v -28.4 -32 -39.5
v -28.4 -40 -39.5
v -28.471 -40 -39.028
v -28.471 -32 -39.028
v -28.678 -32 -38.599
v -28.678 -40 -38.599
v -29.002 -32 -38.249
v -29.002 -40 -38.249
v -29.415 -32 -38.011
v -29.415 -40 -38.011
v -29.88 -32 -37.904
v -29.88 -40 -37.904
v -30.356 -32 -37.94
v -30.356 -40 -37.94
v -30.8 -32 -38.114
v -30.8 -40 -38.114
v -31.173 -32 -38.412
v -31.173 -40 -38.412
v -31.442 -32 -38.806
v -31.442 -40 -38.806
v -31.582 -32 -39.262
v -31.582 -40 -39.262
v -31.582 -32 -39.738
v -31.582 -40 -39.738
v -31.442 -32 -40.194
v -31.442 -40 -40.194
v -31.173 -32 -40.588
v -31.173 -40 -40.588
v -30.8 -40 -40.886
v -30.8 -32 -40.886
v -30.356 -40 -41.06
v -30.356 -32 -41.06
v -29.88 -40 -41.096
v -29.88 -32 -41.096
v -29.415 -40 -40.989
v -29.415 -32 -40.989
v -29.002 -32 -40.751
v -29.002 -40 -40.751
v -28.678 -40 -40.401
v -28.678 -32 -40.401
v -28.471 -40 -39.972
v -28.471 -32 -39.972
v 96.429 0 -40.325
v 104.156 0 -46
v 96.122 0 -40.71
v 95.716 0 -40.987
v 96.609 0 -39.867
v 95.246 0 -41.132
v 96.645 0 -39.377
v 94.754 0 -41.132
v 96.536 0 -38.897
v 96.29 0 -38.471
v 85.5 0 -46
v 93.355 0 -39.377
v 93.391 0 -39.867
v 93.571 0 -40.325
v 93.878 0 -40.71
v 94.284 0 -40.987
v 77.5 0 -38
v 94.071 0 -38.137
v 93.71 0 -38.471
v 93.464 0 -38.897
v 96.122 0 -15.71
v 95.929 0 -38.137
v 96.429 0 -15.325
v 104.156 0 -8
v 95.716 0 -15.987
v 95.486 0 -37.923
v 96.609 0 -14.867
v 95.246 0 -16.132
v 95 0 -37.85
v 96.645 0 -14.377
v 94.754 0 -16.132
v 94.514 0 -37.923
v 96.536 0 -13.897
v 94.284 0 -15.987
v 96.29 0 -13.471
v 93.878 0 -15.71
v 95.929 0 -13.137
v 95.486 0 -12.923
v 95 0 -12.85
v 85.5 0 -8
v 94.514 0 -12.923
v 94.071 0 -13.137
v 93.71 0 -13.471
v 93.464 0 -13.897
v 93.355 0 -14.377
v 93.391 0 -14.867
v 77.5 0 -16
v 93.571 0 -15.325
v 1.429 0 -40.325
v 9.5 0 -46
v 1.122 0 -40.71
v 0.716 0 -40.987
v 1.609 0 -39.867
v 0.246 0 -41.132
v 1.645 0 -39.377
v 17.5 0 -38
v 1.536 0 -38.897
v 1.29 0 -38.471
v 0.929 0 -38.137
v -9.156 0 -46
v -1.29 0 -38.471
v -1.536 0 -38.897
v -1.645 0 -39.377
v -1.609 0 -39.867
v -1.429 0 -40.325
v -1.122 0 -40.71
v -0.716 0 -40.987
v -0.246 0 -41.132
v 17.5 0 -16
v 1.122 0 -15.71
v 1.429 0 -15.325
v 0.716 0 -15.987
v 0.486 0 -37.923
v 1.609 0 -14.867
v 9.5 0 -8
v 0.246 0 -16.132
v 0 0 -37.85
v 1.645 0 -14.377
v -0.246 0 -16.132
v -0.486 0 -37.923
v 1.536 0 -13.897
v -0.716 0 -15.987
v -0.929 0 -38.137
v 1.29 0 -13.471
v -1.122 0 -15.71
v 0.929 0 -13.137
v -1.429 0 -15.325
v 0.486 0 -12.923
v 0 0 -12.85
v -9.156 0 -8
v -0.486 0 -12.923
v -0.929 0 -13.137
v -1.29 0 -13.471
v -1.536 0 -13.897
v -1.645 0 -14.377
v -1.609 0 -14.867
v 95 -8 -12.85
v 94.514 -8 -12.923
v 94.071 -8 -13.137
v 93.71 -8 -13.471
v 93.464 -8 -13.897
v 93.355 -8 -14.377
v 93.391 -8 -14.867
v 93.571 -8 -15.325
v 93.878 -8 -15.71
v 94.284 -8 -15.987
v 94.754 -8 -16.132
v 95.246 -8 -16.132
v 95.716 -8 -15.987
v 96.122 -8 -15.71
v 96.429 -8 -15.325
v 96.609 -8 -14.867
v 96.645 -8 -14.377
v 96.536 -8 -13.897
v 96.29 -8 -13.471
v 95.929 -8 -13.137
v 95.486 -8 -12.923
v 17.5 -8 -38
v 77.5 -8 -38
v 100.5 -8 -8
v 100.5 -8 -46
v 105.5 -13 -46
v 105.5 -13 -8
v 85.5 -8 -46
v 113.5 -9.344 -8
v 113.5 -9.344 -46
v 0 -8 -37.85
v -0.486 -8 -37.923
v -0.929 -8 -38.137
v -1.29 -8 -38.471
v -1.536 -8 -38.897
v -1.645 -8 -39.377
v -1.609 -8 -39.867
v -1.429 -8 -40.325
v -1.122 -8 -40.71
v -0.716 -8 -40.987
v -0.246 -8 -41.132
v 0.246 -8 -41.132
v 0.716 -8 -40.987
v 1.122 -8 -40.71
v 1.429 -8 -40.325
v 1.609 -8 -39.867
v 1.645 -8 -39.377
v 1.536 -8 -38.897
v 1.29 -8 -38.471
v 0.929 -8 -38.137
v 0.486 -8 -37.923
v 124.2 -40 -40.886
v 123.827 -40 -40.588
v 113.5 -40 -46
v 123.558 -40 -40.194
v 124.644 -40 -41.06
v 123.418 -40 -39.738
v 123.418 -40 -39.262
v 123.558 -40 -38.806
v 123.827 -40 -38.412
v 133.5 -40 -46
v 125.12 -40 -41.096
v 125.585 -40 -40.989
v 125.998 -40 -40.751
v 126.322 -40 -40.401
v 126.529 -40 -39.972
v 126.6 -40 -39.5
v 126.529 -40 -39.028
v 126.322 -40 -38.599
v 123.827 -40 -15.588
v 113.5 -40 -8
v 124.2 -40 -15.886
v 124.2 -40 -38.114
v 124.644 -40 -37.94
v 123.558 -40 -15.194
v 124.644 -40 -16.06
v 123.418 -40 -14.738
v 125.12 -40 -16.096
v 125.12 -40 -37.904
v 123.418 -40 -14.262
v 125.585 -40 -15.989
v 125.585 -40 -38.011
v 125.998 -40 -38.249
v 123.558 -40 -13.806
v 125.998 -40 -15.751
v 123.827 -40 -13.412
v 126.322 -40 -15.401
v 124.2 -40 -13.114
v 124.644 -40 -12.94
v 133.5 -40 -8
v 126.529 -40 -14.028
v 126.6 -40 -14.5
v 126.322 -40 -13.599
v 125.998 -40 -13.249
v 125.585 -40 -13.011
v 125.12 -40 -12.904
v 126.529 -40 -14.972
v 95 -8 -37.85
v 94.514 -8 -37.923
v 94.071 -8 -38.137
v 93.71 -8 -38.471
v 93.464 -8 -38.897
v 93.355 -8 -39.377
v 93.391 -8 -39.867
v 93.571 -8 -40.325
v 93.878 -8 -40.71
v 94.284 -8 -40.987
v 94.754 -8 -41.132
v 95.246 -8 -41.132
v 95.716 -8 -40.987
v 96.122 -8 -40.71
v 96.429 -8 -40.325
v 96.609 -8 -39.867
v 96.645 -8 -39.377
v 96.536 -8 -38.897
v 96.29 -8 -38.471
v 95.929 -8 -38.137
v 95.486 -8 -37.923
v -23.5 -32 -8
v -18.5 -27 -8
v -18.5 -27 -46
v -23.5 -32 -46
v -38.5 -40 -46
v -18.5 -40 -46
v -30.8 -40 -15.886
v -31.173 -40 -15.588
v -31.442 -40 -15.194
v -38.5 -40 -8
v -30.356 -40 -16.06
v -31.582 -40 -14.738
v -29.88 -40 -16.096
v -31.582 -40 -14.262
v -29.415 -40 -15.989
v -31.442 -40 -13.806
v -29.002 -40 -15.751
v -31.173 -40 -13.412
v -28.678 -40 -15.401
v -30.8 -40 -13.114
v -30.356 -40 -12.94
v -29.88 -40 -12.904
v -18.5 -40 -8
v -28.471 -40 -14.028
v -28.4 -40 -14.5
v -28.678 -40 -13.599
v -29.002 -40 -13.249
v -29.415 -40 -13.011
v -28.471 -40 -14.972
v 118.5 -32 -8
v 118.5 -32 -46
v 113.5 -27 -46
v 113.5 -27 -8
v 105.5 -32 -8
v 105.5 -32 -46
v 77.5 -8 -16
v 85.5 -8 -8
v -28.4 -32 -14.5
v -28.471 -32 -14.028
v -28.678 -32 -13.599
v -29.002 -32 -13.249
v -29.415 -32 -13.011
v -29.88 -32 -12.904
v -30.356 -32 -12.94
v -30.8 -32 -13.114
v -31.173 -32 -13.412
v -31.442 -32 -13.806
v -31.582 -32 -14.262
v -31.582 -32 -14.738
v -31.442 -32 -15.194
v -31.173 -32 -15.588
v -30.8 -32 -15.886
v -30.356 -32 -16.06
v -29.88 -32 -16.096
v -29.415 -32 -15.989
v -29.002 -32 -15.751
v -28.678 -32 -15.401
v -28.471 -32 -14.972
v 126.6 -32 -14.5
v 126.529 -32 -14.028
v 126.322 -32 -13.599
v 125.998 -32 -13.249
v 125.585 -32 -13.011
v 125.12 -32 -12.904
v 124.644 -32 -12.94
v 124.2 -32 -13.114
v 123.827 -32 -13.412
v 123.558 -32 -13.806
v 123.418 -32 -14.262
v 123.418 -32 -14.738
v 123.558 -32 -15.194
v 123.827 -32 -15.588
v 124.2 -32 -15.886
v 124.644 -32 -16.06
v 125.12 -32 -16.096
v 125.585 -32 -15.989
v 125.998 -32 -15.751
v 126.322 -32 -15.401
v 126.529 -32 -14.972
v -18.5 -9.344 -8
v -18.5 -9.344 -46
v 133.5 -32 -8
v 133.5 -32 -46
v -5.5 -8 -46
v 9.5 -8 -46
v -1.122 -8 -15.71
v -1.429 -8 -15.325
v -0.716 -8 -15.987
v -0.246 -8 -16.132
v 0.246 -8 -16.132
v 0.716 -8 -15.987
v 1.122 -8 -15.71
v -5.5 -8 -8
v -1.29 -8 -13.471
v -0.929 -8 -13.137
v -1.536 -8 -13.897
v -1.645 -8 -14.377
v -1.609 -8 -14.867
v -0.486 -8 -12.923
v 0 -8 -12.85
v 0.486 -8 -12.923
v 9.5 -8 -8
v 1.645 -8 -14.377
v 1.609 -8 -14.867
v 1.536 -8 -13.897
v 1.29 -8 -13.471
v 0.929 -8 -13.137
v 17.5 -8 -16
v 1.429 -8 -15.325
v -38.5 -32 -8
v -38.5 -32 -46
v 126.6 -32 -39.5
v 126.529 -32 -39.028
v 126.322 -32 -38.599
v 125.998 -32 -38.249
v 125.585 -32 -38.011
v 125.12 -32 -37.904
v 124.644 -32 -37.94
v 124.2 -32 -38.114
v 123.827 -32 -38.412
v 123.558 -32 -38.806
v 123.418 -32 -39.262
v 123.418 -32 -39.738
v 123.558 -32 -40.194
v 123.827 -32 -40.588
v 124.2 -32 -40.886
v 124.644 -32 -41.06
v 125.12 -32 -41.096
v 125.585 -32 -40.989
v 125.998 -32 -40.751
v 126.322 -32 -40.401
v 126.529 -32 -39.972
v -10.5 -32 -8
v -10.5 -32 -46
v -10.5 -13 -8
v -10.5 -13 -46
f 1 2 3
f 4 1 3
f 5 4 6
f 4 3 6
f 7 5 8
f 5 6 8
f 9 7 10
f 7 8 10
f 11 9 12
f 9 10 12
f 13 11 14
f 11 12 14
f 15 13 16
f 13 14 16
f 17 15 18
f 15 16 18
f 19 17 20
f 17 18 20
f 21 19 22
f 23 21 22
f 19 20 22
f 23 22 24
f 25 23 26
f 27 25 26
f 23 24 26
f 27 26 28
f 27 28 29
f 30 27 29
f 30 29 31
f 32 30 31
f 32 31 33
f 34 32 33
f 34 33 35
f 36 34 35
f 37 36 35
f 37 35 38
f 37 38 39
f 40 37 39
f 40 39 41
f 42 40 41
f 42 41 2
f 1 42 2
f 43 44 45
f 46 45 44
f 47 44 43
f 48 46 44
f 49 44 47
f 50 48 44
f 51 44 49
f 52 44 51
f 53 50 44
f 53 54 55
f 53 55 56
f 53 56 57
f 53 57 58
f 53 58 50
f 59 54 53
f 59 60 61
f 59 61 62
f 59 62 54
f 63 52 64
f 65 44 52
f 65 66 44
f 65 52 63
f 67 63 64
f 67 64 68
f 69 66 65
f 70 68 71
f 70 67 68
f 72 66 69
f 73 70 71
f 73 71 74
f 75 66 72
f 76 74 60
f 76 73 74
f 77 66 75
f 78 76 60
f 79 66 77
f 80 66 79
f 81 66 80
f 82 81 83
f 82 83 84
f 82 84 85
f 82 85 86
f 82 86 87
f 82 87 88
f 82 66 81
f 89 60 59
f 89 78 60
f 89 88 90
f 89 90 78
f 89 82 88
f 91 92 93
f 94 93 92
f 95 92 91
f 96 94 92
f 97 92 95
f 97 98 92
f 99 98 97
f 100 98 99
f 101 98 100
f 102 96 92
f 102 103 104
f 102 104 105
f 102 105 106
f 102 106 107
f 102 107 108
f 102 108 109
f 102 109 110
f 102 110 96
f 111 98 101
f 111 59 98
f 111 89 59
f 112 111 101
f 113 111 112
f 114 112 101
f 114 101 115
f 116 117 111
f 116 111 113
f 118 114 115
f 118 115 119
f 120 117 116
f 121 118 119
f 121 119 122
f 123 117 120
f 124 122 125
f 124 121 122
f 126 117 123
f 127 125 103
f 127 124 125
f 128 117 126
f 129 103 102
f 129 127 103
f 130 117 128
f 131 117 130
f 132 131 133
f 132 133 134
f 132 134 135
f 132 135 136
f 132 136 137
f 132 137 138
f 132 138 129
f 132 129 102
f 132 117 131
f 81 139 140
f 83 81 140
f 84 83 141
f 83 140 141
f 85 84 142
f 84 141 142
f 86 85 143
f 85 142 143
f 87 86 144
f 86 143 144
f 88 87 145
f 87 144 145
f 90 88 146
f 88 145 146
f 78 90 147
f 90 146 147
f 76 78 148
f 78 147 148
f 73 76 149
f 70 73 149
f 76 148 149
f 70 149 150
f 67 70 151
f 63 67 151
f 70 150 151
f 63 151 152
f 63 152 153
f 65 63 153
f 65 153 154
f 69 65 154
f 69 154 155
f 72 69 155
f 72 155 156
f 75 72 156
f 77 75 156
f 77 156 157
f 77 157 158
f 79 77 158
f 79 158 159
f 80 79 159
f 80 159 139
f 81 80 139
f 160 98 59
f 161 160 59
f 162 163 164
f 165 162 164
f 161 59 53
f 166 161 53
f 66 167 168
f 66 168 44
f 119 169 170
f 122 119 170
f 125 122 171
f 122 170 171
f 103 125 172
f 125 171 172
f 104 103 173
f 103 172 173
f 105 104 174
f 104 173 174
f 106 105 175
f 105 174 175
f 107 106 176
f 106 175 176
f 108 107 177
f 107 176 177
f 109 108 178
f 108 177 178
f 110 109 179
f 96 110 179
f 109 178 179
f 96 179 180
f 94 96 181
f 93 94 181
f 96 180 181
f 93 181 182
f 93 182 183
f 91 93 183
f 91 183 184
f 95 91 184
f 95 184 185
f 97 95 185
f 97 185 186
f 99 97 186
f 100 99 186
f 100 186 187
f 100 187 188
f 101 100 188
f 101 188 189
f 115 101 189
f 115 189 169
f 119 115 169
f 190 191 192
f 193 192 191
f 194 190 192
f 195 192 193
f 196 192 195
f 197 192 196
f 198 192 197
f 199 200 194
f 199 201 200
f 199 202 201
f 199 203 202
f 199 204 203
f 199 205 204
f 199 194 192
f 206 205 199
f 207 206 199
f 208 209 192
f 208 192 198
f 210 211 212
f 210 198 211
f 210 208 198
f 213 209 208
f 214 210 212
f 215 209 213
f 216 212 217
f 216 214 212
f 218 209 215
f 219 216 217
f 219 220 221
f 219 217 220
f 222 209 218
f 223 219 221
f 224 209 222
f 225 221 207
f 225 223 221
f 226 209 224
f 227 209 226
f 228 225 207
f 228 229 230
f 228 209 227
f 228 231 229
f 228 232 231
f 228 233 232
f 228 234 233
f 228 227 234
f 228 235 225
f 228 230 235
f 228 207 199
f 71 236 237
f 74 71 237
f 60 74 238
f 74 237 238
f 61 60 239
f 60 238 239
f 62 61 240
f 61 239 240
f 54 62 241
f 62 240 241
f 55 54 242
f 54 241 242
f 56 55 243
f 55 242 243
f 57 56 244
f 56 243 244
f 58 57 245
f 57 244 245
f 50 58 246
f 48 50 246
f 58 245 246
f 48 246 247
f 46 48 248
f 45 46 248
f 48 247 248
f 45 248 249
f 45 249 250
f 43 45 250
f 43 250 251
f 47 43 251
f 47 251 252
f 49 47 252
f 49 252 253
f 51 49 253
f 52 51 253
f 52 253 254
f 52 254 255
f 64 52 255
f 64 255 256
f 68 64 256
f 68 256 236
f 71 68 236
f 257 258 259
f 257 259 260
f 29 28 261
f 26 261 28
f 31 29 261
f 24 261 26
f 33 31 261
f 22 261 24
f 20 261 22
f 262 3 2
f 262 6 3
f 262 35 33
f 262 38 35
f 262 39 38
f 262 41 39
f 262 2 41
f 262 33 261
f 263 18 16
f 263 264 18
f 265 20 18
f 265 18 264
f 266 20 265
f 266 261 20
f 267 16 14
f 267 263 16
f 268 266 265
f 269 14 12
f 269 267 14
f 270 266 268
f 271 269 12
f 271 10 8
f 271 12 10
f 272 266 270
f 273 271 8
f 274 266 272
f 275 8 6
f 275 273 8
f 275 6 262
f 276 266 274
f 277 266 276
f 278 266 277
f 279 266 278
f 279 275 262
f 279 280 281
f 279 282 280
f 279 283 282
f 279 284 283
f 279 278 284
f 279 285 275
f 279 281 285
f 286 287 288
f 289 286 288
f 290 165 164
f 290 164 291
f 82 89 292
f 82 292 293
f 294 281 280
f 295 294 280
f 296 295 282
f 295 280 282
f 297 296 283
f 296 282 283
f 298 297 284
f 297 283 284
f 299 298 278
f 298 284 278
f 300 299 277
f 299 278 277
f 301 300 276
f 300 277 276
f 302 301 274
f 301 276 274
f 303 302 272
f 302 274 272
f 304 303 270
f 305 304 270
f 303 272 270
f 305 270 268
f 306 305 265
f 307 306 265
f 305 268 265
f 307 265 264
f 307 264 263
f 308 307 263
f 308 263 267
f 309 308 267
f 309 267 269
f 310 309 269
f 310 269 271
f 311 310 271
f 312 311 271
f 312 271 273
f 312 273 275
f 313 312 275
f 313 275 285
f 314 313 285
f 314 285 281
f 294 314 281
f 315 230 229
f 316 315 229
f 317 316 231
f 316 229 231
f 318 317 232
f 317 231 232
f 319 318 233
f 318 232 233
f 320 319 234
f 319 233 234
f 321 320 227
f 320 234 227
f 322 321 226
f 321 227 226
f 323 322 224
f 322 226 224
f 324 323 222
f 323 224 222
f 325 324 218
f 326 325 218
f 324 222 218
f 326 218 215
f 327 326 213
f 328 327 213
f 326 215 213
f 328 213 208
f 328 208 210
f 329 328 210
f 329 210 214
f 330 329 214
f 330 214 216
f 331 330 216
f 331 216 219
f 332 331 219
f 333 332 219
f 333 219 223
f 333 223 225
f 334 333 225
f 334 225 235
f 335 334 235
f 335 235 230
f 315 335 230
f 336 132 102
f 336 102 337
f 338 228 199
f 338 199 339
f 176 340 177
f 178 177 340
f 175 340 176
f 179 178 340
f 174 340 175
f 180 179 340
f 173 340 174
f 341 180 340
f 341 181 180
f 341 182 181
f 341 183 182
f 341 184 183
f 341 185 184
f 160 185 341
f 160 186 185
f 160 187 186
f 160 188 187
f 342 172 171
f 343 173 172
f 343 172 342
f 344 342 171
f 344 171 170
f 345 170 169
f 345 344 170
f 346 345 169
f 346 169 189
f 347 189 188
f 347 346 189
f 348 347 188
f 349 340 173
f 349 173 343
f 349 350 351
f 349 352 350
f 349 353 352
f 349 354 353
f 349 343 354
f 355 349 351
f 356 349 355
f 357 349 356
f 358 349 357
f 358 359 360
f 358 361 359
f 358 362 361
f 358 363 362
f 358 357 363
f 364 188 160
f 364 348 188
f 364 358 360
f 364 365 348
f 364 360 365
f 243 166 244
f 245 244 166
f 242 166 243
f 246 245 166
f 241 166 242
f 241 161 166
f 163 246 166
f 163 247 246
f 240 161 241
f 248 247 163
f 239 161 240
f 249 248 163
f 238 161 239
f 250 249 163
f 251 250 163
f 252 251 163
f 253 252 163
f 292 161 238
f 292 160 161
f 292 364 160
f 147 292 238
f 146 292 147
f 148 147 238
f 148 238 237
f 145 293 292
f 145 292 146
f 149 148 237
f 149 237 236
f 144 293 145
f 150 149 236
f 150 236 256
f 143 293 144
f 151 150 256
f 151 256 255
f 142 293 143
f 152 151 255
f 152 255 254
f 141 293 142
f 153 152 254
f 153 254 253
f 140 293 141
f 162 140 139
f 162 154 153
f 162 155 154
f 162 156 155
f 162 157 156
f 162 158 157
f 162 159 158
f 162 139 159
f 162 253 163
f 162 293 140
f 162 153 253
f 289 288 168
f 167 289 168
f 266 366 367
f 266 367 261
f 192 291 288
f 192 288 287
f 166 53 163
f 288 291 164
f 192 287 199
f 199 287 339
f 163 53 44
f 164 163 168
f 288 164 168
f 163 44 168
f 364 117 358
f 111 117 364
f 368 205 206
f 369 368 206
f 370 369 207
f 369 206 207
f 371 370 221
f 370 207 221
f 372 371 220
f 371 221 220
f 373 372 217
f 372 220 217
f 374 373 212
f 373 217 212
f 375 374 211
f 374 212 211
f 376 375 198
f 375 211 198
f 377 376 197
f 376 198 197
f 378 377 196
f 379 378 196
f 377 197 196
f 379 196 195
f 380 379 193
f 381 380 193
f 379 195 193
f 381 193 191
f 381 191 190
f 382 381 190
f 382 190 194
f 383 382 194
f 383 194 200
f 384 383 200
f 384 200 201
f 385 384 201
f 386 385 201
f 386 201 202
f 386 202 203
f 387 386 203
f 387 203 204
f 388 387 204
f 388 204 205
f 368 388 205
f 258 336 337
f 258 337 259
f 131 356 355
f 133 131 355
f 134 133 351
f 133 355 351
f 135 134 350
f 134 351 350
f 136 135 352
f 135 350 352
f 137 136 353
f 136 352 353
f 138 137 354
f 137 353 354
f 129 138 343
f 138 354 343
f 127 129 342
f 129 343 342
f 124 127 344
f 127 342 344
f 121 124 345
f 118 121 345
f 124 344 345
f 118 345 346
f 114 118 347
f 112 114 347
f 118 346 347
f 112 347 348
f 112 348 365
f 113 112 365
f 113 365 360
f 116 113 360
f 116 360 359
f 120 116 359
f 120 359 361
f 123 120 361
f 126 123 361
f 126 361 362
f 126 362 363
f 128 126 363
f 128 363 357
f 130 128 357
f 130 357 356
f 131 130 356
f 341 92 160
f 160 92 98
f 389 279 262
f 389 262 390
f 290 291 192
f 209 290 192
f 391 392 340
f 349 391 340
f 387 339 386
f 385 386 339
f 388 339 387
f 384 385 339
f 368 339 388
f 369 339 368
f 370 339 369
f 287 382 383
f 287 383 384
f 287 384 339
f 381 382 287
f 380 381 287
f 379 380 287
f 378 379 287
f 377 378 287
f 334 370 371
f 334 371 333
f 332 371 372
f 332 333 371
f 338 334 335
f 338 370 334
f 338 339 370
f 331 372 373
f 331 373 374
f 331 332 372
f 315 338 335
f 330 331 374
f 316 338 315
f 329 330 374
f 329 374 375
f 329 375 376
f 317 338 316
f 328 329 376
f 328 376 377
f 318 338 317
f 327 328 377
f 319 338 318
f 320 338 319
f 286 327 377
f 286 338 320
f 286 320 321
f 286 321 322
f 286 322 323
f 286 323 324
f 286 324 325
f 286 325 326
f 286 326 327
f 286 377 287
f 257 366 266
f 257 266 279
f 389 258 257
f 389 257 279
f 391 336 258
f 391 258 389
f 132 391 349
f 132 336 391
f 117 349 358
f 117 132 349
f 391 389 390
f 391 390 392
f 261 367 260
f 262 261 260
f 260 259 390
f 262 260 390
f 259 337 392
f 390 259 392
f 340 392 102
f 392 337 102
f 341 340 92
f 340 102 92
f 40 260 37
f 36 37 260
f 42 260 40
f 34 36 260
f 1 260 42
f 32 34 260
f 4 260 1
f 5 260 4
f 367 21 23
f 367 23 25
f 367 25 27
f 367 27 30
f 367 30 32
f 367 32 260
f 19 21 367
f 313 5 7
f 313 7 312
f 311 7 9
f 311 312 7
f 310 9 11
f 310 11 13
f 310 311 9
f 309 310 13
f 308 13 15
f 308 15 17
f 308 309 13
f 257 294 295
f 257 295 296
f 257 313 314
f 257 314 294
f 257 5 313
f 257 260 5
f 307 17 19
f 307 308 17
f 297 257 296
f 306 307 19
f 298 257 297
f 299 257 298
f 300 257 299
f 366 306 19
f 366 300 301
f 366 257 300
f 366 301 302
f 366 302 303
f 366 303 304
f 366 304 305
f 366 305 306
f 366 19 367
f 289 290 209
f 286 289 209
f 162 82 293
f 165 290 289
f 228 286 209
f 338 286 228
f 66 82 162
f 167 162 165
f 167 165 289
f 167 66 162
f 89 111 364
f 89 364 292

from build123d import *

# Parameters (mm, degrees)
EXTRUDE1_DEPTH     = 46
SKETCH2_R          = 1.6
CUT_EXTRUDE1_DEPTH = 5000
EXTRUDE2_DEPTH     = 8
EXTRUDE3_DEPTH     = 8


with BuildPart() as part:
    # Sketch1 → Extrude1 (new body)
    with BuildSketch(Plane.XY):
        Polygon((-38.5, -40), (-18.5, -40), (-10.5, -32), (-10.5, -13), (-5.5, -8), (100.5, -8), (105.5, -13), (105.5, -32), (113.5, -40), (133.5, -40), (133.5, -32), (118.5, -32), (113.5, -27), (113.5, -9.344202483), (104.155797517, 0), (-9.155797517, 0), (-18.5, -9.344202483), (-18.5, -27), (-23.5, -32), (-38.5, -32), align=None)
    extrude(amount=-EXTRUDE1_DEPTH)

    # Sketch2 → Cut-Extrude1 (cut)
    with BuildSketch(Plane.XZ.offset(40)):
        with Locations((-30.000001952, -14.5)):
            Circle(SKETCH2_R)
        with Locations((-30.000001952, -39.5)):
            Circle(SKETCH2_R)
        with Locations((125, -14.5)):
            Circle(SKETCH2_R)
        with Locations((125, -39.5)):
            Circle(SKETCH2_R)
        with BuildLine():
            ThreePointArc((0, -16.15), (1.65, -14.5), (0, -12.85))
            ThreePointArc((0, -12.85), (-1.65, -14.5), (0, -16.15))
        make_face()
        with BuildLine():
            ThreePointArc((0, -41.15), (1.65, -39.5), (0, -37.85))
            ThreePointArc((0, -37.85), (-1.65, -39.5), (0, -41.15))
        make_face()
        with BuildLine():
            ThreePointArc((95, -16.15), (96.65, -14.5), (95, -12.85))
            ThreePointArc((95, -12.85), (93.35, -14.5), (95, -16.15))
        make_face()
        with BuildLine():
            ThreePointArc((95, -41.15), (96.65, -39.5), (95, -37.85))
            ThreePointArc((95, -37.85), (93.35, -39.5), (95, -41.15))
        make_face()
    extrude(amount=-CUT_EXTRUDE1_DEPTH, mode=Mode.SUBTRACT)

    # Sketch3 → Extrude2 (cut)
    with BuildSketch(Plane.XY):
        Polygon((-38.5, -32), (-38.5, -40), (-18.5, -40), (-10.5, -32), (-10.5, -13), (-5.5, -8), (100.5, -8), (105.5, -13), (105.5, -32), (113.5, -40), (133.5, -40), (133.5, -32), (118.5, -32), (113.5, -27), (113.5, -9.344202483), (104.155797517, 0), (-9.155797517, 0), (-18.5, -9.344202483), (-18.5, -27), (-23.5, -32), align=None)
    extrude(amount=-EXTRUDE2_DEPTH, mode=Mode.SUBTRACT)

    # Sketch4 → Extrude3 (cut)
    with BuildSketch(Plane(origin=(0, 0, 0), x_dir=(1, 0, 0), z_dir=(0, 1, 0))):
        Polygon((9.5, 46), (17.5, 38), (77.5, 38), (85.5, 46), align=None)
        Polygon((85.5, 8), (9.5, 8), (17.5, 16), (77.5, 16), align=None)
    extrude(amount=-EXTRUDE3_DEPTH, mode=Mode.SUBTRACT)


solid = part.part
